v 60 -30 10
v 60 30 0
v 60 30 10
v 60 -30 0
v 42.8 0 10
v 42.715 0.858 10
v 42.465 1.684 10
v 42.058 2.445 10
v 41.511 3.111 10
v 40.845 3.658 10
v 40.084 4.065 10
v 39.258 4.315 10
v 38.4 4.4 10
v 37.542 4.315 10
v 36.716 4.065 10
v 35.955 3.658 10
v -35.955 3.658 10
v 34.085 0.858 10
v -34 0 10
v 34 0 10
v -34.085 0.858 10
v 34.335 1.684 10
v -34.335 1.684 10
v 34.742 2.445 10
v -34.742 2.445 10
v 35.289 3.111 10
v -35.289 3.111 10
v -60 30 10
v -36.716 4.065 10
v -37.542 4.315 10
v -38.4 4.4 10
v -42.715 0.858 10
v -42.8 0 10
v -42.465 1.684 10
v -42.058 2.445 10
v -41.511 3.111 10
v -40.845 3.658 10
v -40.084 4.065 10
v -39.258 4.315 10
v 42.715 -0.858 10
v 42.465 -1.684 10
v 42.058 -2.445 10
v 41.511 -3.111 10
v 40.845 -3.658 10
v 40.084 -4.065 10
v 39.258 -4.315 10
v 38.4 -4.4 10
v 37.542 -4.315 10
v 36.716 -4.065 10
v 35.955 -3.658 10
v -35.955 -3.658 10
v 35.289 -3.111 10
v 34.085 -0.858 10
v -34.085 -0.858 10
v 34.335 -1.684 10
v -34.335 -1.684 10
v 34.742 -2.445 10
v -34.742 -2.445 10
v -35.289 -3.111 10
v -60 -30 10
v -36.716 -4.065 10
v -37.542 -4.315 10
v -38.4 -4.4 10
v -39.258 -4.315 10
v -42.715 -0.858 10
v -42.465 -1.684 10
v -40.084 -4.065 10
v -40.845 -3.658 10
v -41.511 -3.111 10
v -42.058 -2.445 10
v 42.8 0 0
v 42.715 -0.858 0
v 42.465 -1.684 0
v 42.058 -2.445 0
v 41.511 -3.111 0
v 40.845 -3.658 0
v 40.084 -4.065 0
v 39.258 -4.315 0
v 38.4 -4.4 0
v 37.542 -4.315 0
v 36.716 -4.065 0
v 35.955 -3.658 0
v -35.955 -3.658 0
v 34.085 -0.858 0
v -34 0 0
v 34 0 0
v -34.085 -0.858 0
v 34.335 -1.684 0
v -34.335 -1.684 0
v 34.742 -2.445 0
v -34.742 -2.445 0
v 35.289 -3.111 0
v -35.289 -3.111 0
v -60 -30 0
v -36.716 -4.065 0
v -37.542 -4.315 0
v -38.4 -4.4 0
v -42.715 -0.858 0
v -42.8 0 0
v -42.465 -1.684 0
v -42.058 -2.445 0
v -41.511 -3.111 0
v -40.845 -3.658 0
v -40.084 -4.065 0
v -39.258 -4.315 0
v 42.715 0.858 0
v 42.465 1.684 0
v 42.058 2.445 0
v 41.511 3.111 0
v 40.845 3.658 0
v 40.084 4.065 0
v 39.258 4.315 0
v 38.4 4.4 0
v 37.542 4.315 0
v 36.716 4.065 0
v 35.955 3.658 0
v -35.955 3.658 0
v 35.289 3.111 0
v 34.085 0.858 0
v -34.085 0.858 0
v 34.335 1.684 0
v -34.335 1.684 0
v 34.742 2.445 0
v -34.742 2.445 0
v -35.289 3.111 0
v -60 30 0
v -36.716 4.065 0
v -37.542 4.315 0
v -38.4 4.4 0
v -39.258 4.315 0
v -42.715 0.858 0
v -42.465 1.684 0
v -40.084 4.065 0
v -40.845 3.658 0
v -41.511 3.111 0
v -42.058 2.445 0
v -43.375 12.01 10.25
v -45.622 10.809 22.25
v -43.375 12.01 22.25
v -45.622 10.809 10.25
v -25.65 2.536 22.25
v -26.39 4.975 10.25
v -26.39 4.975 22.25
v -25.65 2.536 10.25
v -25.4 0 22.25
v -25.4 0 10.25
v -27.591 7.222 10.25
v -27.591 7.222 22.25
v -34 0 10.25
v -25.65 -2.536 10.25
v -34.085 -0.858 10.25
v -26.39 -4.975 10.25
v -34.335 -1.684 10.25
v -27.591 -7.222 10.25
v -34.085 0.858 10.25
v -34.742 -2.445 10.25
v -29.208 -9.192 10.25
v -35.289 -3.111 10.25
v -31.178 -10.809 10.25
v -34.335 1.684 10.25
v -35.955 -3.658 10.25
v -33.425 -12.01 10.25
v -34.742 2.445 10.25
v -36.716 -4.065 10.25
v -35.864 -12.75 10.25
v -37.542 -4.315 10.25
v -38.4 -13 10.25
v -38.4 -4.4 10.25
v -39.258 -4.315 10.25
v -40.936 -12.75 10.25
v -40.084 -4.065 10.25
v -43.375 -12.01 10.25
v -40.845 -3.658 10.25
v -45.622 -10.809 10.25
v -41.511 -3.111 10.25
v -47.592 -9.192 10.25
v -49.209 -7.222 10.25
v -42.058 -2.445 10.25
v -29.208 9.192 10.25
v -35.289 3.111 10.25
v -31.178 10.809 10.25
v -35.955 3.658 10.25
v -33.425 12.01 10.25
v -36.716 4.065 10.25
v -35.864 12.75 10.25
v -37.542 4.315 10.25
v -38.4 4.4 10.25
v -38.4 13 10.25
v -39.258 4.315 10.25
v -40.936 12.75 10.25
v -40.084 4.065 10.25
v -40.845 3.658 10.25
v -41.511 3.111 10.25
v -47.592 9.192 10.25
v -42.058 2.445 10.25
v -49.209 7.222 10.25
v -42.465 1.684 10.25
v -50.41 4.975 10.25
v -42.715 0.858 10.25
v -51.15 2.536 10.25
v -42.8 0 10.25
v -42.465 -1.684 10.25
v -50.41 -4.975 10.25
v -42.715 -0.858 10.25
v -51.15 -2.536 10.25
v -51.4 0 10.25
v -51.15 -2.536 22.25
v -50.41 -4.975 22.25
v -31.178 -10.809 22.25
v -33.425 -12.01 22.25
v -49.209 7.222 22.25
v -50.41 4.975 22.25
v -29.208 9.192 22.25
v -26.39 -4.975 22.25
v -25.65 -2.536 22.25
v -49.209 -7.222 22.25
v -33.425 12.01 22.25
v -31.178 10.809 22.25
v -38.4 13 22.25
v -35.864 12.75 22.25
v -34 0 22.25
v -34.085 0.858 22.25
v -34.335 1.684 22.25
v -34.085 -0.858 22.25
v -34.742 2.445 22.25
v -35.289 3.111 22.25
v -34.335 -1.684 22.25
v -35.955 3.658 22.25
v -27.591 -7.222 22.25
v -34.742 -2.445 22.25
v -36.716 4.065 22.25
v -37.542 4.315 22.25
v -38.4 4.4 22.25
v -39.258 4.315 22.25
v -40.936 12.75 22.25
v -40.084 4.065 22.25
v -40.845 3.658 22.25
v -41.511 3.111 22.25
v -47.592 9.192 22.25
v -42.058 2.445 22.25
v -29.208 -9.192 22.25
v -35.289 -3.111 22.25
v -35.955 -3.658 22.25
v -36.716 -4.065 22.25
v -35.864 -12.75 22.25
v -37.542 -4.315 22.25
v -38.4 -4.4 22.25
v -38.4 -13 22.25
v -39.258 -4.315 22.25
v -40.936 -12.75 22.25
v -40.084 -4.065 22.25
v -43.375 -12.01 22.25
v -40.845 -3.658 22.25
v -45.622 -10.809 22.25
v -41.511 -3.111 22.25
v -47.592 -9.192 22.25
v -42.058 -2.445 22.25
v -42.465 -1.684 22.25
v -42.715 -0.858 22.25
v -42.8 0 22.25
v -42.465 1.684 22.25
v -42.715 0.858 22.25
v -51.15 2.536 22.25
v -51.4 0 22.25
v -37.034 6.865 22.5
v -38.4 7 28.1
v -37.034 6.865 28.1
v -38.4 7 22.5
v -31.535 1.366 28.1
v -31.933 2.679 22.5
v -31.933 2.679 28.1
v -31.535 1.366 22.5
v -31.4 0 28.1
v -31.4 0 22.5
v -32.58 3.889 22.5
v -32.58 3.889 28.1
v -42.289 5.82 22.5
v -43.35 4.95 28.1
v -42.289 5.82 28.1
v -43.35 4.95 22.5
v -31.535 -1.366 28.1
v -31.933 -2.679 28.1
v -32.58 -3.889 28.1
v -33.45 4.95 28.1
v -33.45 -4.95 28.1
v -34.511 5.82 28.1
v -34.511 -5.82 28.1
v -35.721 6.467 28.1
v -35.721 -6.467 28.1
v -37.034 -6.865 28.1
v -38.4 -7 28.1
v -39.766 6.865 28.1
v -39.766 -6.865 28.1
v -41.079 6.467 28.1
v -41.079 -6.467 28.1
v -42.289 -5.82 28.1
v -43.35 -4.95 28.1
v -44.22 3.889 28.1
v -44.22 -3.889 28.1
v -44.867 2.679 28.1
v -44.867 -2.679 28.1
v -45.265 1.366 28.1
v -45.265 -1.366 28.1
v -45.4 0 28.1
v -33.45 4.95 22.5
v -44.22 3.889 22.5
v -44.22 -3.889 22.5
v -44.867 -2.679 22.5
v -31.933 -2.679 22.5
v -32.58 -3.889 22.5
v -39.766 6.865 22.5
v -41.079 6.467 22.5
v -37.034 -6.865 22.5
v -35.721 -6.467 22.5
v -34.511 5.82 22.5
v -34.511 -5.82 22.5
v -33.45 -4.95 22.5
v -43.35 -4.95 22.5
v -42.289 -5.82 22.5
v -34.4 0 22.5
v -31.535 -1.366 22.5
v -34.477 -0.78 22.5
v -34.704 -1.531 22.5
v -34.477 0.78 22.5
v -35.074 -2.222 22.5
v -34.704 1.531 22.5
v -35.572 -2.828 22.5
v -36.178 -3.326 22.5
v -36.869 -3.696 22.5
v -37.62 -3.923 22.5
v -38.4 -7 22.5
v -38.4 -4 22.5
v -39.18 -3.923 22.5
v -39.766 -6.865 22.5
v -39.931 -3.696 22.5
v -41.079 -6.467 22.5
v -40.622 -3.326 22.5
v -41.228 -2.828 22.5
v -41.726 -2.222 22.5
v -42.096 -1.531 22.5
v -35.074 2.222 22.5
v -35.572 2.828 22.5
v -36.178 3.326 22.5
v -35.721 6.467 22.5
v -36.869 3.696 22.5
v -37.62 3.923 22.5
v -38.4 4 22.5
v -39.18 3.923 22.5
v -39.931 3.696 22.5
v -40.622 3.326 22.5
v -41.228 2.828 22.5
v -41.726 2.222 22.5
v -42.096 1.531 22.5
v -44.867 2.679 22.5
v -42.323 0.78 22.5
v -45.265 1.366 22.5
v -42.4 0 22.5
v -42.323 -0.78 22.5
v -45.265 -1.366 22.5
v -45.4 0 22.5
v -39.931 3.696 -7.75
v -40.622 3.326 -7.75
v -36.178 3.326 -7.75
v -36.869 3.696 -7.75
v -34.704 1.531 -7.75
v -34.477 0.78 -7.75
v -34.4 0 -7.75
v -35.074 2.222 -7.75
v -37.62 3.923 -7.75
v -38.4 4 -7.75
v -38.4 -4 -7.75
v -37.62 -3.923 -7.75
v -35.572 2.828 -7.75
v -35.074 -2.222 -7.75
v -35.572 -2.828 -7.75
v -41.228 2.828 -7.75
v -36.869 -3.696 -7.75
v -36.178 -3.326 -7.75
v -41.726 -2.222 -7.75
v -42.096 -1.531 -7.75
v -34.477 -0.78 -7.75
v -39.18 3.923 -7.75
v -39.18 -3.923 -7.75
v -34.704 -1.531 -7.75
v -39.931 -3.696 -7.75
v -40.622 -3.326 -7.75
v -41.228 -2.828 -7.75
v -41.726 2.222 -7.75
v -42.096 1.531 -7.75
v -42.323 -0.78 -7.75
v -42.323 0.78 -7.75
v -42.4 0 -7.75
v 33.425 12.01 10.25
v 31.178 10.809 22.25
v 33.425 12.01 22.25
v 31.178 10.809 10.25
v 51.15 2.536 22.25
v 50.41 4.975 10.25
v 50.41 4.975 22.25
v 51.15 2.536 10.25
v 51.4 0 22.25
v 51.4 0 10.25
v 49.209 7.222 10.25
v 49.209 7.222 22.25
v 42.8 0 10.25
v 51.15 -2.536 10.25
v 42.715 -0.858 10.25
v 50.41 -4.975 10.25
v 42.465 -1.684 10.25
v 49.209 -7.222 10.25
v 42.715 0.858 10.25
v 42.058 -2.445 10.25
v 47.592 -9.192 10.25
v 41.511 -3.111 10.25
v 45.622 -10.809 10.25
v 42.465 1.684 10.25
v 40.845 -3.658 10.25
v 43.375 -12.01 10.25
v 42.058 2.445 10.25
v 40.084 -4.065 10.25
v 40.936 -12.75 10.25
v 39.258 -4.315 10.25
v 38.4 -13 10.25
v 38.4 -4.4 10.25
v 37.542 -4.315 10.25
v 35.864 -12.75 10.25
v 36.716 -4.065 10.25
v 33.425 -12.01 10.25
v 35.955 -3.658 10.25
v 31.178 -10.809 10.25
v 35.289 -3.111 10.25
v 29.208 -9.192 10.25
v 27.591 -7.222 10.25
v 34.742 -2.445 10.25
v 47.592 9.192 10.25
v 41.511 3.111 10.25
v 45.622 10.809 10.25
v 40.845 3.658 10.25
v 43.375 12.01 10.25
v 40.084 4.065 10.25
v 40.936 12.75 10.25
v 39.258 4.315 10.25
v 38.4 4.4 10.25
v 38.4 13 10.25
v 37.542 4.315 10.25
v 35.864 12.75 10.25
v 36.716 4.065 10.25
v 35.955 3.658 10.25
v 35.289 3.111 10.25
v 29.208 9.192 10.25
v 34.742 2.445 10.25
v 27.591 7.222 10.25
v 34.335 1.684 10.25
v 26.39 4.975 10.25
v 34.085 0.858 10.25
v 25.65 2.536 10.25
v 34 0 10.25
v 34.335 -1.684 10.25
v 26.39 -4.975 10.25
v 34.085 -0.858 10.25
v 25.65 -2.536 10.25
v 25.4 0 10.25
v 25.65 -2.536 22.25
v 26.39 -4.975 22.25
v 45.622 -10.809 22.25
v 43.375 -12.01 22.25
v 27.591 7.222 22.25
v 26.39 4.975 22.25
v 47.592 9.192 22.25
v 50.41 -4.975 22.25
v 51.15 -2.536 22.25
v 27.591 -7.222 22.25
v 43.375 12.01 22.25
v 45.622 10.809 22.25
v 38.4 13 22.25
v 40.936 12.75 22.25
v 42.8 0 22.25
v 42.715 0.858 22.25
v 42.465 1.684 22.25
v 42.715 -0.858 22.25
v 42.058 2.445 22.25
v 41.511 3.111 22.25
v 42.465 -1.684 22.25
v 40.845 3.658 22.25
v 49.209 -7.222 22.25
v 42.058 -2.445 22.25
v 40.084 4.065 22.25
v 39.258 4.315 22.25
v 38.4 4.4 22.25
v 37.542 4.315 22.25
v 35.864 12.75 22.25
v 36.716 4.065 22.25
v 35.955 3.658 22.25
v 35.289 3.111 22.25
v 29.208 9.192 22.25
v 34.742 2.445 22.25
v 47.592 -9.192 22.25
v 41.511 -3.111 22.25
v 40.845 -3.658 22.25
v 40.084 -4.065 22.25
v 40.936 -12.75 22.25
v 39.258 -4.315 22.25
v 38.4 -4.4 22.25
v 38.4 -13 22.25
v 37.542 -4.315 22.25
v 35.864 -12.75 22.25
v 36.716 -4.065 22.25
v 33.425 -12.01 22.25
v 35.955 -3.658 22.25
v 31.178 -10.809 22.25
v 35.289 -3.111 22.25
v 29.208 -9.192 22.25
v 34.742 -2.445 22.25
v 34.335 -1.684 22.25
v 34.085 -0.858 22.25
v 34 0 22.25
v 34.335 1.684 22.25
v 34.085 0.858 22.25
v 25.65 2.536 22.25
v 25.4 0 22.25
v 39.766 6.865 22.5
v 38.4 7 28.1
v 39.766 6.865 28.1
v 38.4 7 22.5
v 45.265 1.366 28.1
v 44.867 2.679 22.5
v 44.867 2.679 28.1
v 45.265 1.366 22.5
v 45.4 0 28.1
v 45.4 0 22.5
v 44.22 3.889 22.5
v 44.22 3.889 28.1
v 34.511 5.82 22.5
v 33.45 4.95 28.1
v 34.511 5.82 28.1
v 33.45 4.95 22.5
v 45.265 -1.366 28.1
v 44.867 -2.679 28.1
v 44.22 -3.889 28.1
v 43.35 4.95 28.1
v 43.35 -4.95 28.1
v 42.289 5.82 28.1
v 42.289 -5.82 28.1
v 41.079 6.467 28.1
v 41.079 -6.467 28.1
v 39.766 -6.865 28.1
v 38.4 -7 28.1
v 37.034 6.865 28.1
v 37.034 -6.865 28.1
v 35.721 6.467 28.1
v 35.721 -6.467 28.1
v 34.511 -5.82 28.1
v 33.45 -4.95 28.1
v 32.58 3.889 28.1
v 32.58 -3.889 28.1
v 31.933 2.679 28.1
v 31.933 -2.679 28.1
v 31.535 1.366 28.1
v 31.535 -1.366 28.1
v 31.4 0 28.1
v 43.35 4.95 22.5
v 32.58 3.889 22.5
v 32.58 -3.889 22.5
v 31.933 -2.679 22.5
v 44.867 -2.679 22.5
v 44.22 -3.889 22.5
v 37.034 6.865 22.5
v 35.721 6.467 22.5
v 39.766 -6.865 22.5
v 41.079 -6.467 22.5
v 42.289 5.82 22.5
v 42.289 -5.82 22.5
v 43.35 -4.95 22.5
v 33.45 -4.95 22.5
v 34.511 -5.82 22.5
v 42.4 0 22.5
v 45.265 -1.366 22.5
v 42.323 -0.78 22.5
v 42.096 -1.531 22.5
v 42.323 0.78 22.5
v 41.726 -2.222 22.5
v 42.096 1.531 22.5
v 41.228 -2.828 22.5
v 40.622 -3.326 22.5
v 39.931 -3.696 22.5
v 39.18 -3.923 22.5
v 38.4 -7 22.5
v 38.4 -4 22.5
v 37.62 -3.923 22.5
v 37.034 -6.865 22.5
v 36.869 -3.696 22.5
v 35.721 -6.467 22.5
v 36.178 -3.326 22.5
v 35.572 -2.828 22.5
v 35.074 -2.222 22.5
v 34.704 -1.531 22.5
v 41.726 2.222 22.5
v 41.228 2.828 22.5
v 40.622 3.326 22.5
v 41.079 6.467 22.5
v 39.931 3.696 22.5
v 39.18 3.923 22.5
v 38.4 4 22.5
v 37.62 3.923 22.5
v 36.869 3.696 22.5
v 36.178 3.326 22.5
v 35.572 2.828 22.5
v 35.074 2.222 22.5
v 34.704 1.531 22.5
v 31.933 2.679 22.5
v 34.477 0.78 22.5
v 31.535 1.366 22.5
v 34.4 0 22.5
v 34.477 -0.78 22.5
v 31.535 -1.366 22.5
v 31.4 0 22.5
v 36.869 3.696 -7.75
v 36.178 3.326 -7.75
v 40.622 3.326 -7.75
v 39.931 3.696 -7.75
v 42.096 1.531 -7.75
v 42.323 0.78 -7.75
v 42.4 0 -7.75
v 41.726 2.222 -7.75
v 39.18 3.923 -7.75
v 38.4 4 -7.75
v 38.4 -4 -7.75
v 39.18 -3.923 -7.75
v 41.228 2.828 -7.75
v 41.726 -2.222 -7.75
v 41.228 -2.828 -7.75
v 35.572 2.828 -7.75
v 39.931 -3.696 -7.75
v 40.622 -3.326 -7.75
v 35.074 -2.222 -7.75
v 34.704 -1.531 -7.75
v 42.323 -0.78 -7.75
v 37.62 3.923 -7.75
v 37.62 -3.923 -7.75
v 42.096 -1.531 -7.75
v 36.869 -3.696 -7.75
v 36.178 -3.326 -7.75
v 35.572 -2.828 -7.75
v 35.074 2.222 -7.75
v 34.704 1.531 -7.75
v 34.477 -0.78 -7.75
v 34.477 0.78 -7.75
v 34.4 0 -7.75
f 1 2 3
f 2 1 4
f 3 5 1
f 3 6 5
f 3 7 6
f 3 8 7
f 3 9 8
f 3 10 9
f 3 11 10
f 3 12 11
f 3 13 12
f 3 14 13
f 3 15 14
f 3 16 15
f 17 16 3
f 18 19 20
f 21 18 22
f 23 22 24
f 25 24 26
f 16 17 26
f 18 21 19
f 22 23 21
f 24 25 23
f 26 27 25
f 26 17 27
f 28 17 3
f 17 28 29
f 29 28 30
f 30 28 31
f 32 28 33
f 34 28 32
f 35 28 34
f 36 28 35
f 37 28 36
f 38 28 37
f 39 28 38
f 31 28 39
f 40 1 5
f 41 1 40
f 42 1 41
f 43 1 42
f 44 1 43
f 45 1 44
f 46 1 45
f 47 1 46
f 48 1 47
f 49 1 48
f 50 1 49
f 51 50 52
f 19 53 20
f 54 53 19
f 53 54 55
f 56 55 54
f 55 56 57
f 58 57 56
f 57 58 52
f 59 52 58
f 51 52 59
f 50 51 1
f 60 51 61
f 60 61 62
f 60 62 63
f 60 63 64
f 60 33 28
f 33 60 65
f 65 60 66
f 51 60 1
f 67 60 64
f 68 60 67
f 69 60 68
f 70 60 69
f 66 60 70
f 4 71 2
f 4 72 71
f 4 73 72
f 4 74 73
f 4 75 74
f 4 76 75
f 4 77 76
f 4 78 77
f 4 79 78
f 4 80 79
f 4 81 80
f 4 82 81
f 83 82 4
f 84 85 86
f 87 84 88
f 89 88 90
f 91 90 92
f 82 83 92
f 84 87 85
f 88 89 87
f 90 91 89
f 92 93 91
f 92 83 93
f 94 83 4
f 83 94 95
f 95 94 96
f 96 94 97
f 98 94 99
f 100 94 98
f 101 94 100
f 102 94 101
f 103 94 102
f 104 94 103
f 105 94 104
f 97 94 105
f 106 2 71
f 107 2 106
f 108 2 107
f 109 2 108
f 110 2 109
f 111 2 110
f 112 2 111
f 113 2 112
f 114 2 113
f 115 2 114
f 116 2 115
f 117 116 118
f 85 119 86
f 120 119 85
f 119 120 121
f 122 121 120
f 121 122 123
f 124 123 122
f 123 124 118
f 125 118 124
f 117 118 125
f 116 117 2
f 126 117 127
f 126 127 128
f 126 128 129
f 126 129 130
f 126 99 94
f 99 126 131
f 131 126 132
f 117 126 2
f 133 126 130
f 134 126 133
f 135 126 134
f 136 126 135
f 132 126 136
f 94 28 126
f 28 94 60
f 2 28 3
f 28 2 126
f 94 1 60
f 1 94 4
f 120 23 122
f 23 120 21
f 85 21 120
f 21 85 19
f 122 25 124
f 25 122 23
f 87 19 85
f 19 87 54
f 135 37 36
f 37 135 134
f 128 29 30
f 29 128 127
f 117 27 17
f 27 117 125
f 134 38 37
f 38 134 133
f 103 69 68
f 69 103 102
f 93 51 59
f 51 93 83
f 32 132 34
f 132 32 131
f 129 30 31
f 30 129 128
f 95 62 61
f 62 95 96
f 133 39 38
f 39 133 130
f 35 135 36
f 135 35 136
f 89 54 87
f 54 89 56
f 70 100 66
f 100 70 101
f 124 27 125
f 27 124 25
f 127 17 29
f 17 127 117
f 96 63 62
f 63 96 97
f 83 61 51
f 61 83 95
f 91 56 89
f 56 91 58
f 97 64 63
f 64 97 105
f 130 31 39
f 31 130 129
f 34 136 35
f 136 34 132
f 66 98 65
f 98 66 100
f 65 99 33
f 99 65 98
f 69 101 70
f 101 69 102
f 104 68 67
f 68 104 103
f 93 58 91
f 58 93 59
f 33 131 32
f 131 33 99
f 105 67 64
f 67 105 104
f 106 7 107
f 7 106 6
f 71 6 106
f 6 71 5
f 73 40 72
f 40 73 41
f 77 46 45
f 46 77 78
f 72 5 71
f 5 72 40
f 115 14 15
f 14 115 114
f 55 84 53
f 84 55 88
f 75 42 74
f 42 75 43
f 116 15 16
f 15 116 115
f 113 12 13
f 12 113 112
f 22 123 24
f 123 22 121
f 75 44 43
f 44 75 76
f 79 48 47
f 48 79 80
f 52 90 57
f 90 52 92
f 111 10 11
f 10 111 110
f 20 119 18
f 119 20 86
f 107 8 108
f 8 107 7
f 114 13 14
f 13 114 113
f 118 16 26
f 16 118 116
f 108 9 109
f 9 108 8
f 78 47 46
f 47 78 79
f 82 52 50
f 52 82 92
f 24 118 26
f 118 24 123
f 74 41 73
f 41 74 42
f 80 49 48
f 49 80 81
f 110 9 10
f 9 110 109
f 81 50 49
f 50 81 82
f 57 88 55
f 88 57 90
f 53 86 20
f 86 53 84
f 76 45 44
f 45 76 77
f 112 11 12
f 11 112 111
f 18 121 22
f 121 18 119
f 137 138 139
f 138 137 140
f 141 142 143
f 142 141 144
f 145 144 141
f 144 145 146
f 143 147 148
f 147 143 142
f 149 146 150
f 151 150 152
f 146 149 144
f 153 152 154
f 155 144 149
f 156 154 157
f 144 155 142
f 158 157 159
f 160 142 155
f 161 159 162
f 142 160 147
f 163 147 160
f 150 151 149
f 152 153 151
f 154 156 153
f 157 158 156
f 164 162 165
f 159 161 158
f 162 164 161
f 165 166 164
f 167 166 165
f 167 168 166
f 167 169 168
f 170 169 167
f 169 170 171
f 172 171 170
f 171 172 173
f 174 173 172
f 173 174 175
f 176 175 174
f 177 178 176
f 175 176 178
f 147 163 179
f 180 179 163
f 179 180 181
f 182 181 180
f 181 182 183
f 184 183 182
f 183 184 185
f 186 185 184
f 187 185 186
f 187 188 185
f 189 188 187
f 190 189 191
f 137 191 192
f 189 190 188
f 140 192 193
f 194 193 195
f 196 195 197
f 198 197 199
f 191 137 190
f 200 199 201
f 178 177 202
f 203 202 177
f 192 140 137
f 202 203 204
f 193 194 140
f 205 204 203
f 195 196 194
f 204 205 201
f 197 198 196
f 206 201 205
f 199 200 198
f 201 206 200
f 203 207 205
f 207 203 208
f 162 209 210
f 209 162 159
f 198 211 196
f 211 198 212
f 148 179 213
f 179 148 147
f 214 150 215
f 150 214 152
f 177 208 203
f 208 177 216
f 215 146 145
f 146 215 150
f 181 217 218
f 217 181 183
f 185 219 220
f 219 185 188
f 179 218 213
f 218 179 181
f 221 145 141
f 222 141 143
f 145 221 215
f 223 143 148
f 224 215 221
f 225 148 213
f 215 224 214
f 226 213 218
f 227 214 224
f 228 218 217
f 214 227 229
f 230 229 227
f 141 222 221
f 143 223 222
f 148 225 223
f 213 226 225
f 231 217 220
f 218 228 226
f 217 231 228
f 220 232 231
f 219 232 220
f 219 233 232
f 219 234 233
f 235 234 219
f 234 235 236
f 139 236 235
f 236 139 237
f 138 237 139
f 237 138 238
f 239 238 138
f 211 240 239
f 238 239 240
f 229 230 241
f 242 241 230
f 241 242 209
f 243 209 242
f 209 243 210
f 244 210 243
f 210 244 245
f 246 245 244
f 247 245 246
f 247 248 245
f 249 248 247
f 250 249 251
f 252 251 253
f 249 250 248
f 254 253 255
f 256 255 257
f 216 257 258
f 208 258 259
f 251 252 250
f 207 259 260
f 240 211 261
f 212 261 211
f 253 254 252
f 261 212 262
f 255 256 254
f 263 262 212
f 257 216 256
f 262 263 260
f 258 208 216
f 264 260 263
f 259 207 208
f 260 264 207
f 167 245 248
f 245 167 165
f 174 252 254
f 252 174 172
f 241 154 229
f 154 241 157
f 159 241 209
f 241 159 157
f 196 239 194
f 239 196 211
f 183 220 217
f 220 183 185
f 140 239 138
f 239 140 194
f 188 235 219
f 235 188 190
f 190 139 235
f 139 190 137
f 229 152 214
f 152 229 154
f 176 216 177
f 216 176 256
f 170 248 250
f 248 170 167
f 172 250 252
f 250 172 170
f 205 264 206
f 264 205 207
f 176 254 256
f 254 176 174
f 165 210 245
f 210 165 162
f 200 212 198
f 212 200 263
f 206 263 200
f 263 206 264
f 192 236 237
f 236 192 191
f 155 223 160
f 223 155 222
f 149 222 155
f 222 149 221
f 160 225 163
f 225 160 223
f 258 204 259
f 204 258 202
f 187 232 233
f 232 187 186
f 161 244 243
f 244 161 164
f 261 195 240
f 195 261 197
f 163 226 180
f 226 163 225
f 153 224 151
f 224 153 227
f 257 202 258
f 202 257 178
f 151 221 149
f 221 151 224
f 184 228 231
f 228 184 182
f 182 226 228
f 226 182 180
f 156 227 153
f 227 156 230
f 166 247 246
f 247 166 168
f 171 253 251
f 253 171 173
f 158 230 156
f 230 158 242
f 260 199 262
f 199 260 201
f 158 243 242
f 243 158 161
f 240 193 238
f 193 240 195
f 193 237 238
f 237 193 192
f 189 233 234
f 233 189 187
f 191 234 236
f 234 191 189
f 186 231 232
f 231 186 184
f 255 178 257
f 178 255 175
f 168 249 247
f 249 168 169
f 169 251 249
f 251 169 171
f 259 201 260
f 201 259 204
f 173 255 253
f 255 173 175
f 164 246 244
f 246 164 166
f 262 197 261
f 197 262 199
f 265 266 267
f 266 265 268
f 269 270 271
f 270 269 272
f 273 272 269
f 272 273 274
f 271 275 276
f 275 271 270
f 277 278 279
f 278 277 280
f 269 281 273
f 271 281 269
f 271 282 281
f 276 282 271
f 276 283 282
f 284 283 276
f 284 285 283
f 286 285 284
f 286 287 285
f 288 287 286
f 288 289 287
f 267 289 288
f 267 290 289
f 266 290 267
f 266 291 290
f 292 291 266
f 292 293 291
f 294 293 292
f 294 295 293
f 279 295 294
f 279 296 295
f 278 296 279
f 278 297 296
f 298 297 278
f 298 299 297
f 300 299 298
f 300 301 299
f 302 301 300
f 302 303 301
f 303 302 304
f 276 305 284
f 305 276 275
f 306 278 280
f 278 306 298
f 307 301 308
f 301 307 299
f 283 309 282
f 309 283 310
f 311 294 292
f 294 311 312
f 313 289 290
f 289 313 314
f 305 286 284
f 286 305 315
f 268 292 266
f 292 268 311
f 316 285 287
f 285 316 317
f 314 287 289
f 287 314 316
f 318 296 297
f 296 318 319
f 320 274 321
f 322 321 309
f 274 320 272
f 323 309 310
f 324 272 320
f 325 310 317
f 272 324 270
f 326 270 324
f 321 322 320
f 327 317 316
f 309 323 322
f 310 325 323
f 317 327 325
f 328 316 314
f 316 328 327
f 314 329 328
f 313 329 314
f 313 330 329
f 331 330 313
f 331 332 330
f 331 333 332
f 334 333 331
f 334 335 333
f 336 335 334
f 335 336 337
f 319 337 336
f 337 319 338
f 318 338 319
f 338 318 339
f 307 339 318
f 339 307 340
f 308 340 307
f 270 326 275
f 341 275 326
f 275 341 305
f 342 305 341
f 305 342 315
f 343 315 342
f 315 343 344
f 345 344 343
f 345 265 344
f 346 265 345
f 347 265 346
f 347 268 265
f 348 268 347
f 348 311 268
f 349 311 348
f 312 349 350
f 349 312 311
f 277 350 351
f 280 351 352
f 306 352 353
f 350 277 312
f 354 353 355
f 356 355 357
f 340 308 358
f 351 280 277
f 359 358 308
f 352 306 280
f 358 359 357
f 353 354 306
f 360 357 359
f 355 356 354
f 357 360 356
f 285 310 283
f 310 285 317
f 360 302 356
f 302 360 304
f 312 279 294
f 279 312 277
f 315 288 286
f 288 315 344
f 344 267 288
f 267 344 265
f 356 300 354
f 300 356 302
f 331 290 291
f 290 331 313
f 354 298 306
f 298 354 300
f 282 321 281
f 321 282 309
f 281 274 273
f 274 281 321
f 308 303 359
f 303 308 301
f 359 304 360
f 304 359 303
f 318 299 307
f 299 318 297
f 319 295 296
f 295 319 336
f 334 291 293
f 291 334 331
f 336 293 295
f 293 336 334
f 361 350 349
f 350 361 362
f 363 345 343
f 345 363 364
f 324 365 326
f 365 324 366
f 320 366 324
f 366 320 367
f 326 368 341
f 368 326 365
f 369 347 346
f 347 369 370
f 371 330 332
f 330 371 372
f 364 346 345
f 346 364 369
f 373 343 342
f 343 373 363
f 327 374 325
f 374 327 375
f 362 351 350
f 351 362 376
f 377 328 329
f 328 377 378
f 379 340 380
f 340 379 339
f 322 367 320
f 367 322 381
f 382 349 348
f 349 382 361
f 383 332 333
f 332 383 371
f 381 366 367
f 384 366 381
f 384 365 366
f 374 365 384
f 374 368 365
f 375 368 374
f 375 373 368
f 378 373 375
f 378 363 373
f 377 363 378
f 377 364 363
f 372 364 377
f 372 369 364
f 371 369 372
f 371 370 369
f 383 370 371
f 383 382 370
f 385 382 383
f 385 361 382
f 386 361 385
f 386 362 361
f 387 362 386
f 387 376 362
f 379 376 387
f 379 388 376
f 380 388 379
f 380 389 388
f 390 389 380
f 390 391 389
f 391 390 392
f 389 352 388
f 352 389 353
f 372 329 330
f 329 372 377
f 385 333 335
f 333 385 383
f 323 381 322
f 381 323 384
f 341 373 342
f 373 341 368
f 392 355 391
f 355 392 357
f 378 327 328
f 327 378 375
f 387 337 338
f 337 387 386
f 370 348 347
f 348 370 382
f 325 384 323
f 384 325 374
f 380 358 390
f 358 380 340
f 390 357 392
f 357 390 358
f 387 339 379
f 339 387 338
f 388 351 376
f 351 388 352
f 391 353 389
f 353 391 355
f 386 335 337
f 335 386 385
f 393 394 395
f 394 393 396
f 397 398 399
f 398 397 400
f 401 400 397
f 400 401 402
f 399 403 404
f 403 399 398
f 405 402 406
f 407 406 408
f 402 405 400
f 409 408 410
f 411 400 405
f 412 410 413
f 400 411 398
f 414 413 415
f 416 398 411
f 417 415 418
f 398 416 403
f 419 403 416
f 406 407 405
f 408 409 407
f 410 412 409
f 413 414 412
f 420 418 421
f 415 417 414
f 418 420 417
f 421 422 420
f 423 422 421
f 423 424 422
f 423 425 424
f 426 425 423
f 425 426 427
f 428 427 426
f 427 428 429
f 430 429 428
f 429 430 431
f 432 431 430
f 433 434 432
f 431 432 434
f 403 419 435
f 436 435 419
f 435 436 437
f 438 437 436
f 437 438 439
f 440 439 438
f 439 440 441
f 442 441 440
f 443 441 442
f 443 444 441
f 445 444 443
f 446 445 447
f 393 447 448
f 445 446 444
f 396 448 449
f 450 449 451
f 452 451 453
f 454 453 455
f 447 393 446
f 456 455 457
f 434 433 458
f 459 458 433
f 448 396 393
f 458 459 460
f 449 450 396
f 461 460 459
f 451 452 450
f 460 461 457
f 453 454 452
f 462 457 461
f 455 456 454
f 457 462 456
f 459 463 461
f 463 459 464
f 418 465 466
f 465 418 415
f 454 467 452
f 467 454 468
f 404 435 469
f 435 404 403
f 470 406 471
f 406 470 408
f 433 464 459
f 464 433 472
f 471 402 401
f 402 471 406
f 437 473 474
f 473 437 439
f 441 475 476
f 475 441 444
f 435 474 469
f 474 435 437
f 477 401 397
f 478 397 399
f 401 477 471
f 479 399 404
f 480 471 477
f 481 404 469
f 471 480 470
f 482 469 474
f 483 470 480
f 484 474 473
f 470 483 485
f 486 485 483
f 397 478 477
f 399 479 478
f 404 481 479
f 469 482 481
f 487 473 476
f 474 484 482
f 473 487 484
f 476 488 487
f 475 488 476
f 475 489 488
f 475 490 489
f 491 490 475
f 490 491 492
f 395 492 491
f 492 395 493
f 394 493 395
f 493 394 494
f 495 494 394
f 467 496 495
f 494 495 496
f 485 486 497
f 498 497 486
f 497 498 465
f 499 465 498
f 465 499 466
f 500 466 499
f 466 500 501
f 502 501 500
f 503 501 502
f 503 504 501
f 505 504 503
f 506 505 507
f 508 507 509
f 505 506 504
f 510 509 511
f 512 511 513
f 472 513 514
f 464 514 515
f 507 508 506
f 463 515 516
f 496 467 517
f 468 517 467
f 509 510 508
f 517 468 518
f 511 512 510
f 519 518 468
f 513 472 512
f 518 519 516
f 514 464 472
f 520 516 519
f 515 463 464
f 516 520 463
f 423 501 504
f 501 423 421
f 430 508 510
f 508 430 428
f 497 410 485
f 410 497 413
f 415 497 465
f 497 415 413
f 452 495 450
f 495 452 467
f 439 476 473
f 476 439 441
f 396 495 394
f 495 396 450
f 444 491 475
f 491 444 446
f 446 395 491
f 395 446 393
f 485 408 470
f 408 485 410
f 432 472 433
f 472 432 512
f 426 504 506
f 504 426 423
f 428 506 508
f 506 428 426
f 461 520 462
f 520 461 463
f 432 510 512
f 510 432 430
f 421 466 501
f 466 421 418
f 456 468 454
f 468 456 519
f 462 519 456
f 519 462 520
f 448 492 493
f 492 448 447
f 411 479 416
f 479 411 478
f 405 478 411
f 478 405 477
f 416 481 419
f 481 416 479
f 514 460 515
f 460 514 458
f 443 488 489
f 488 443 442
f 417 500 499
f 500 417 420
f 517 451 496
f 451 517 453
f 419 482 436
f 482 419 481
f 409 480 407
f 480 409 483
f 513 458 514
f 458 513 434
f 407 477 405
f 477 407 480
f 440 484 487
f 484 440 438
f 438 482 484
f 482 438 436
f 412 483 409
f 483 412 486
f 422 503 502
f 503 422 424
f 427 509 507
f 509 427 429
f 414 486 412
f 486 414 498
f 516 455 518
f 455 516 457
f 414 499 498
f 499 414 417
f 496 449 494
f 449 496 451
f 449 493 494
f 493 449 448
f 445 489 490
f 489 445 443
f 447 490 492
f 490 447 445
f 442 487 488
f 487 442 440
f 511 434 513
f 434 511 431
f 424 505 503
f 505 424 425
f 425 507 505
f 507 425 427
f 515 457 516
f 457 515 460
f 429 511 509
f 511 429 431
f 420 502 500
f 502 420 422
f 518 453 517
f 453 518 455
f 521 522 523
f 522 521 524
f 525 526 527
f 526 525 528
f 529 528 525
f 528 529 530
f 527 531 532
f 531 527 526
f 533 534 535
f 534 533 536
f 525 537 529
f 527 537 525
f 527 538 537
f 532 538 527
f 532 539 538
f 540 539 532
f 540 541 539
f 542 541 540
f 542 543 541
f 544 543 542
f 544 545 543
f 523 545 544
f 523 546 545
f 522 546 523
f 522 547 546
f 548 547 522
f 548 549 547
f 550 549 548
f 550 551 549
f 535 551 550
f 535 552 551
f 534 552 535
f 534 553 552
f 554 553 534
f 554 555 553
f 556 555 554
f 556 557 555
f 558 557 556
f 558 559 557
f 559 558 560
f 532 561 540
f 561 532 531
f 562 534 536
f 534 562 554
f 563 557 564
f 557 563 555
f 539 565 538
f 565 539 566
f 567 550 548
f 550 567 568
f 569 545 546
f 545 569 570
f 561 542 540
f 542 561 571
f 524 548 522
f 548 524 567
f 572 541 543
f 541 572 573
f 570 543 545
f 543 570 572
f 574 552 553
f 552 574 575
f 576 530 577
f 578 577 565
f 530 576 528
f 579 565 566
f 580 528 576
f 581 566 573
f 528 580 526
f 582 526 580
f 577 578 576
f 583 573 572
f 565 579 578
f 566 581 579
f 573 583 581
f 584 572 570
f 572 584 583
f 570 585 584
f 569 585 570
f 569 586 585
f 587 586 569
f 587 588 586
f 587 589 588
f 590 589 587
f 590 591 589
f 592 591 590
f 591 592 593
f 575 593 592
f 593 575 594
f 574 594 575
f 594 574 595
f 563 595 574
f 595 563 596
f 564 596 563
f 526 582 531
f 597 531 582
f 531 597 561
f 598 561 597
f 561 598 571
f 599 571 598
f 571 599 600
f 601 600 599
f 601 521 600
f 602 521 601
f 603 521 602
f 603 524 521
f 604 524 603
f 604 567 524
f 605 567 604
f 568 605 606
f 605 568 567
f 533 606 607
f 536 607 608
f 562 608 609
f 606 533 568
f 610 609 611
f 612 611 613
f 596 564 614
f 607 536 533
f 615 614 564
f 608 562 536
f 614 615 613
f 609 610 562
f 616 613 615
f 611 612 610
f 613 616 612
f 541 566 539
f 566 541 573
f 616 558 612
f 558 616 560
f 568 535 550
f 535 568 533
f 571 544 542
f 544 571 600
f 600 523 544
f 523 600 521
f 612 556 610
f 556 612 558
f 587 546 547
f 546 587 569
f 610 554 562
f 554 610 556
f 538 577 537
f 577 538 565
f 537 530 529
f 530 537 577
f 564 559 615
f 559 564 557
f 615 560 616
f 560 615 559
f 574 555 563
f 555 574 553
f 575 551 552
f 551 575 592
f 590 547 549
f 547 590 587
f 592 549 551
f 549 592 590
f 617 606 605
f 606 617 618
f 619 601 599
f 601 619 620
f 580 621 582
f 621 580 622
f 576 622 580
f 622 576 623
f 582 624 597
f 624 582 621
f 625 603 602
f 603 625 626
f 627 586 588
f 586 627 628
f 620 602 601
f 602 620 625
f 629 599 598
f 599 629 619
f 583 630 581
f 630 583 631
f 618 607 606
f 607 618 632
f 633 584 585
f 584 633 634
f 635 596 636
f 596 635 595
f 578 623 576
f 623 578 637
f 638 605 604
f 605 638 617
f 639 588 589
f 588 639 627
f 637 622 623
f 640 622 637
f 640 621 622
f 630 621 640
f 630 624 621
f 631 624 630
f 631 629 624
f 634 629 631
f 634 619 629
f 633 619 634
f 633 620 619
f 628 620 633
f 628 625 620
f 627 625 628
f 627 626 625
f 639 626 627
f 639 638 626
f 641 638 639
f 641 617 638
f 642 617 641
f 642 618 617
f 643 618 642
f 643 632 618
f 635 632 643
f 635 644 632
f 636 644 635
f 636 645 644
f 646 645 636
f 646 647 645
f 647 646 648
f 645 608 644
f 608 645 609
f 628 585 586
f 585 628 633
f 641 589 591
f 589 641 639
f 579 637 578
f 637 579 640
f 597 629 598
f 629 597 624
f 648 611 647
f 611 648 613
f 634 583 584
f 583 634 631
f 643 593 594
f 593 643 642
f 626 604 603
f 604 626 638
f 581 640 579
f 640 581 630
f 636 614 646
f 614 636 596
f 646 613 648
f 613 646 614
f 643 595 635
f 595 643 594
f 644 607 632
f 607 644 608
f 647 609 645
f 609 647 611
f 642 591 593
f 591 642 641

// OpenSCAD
$fn = 32;

// ------------------------------------------------------------------------
// Standoff columns: 2 d26 standoffs, bolts d8
// Every part is its own module, assembly() places them once.
// ------------------------------------------------------------------------

// --- part 1 ---
module base_plate() {
  difference() {
    translate([-60, -30, 0]) cube([120, 60, 10]);
    translate([-38.4, 0, -1]) cylinder(h = 12, d = 8.8);
    translate([38.4, 0, -1]) cylinder(h = 12, d = 8.8);
  }
}

// --- part 2 ---
module spacer1() {
  difference() {
      translate([0, 0, 0]) cylinder(h = 12, d = 26);
      translate([0, 0, -1]) cylinder(h = 14, d = 8.8);
    }
}

// --- part 3 ---
module bolt1() {
  cylinder(h = 5.6, d = 14);
  translate([0, 0, -30.25]) cylinder(h = 30.25, d = 8);
}

// --- part 4 ---
module spacer2() {
  difference() {
      translate([0, 0, 0]) cylinder(h = 12, d = 26);
      translate([0, 0, -1]) cylinder(h = 14, d = 8.8);
    }
}

// --- part 5 ---
module bolt2() {
  cylinder(h = 5.6, d = 14);
  translate([0, 0, -30.25]) cylinder(h = 30.25, d = 8);
}

// --- assembly ---
module assembly() {
  translate([0, 0, 0]) rotate([0, 0, 0]) base_plate();
  translate([-38.4, 0, 10.25]) rotate([0, 0, 0]) spacer1();
  translate([-38.4, 0, 22.5]) rotate([0, 0, 0]) bolt1();
  translate([38.4, 0, 10.25]) rotate([0, 0, 0]) spacer2();
  translate([38.4, 0, 22.5]) rotate([0, 0, 0]) bolt2();
}

assembly();
